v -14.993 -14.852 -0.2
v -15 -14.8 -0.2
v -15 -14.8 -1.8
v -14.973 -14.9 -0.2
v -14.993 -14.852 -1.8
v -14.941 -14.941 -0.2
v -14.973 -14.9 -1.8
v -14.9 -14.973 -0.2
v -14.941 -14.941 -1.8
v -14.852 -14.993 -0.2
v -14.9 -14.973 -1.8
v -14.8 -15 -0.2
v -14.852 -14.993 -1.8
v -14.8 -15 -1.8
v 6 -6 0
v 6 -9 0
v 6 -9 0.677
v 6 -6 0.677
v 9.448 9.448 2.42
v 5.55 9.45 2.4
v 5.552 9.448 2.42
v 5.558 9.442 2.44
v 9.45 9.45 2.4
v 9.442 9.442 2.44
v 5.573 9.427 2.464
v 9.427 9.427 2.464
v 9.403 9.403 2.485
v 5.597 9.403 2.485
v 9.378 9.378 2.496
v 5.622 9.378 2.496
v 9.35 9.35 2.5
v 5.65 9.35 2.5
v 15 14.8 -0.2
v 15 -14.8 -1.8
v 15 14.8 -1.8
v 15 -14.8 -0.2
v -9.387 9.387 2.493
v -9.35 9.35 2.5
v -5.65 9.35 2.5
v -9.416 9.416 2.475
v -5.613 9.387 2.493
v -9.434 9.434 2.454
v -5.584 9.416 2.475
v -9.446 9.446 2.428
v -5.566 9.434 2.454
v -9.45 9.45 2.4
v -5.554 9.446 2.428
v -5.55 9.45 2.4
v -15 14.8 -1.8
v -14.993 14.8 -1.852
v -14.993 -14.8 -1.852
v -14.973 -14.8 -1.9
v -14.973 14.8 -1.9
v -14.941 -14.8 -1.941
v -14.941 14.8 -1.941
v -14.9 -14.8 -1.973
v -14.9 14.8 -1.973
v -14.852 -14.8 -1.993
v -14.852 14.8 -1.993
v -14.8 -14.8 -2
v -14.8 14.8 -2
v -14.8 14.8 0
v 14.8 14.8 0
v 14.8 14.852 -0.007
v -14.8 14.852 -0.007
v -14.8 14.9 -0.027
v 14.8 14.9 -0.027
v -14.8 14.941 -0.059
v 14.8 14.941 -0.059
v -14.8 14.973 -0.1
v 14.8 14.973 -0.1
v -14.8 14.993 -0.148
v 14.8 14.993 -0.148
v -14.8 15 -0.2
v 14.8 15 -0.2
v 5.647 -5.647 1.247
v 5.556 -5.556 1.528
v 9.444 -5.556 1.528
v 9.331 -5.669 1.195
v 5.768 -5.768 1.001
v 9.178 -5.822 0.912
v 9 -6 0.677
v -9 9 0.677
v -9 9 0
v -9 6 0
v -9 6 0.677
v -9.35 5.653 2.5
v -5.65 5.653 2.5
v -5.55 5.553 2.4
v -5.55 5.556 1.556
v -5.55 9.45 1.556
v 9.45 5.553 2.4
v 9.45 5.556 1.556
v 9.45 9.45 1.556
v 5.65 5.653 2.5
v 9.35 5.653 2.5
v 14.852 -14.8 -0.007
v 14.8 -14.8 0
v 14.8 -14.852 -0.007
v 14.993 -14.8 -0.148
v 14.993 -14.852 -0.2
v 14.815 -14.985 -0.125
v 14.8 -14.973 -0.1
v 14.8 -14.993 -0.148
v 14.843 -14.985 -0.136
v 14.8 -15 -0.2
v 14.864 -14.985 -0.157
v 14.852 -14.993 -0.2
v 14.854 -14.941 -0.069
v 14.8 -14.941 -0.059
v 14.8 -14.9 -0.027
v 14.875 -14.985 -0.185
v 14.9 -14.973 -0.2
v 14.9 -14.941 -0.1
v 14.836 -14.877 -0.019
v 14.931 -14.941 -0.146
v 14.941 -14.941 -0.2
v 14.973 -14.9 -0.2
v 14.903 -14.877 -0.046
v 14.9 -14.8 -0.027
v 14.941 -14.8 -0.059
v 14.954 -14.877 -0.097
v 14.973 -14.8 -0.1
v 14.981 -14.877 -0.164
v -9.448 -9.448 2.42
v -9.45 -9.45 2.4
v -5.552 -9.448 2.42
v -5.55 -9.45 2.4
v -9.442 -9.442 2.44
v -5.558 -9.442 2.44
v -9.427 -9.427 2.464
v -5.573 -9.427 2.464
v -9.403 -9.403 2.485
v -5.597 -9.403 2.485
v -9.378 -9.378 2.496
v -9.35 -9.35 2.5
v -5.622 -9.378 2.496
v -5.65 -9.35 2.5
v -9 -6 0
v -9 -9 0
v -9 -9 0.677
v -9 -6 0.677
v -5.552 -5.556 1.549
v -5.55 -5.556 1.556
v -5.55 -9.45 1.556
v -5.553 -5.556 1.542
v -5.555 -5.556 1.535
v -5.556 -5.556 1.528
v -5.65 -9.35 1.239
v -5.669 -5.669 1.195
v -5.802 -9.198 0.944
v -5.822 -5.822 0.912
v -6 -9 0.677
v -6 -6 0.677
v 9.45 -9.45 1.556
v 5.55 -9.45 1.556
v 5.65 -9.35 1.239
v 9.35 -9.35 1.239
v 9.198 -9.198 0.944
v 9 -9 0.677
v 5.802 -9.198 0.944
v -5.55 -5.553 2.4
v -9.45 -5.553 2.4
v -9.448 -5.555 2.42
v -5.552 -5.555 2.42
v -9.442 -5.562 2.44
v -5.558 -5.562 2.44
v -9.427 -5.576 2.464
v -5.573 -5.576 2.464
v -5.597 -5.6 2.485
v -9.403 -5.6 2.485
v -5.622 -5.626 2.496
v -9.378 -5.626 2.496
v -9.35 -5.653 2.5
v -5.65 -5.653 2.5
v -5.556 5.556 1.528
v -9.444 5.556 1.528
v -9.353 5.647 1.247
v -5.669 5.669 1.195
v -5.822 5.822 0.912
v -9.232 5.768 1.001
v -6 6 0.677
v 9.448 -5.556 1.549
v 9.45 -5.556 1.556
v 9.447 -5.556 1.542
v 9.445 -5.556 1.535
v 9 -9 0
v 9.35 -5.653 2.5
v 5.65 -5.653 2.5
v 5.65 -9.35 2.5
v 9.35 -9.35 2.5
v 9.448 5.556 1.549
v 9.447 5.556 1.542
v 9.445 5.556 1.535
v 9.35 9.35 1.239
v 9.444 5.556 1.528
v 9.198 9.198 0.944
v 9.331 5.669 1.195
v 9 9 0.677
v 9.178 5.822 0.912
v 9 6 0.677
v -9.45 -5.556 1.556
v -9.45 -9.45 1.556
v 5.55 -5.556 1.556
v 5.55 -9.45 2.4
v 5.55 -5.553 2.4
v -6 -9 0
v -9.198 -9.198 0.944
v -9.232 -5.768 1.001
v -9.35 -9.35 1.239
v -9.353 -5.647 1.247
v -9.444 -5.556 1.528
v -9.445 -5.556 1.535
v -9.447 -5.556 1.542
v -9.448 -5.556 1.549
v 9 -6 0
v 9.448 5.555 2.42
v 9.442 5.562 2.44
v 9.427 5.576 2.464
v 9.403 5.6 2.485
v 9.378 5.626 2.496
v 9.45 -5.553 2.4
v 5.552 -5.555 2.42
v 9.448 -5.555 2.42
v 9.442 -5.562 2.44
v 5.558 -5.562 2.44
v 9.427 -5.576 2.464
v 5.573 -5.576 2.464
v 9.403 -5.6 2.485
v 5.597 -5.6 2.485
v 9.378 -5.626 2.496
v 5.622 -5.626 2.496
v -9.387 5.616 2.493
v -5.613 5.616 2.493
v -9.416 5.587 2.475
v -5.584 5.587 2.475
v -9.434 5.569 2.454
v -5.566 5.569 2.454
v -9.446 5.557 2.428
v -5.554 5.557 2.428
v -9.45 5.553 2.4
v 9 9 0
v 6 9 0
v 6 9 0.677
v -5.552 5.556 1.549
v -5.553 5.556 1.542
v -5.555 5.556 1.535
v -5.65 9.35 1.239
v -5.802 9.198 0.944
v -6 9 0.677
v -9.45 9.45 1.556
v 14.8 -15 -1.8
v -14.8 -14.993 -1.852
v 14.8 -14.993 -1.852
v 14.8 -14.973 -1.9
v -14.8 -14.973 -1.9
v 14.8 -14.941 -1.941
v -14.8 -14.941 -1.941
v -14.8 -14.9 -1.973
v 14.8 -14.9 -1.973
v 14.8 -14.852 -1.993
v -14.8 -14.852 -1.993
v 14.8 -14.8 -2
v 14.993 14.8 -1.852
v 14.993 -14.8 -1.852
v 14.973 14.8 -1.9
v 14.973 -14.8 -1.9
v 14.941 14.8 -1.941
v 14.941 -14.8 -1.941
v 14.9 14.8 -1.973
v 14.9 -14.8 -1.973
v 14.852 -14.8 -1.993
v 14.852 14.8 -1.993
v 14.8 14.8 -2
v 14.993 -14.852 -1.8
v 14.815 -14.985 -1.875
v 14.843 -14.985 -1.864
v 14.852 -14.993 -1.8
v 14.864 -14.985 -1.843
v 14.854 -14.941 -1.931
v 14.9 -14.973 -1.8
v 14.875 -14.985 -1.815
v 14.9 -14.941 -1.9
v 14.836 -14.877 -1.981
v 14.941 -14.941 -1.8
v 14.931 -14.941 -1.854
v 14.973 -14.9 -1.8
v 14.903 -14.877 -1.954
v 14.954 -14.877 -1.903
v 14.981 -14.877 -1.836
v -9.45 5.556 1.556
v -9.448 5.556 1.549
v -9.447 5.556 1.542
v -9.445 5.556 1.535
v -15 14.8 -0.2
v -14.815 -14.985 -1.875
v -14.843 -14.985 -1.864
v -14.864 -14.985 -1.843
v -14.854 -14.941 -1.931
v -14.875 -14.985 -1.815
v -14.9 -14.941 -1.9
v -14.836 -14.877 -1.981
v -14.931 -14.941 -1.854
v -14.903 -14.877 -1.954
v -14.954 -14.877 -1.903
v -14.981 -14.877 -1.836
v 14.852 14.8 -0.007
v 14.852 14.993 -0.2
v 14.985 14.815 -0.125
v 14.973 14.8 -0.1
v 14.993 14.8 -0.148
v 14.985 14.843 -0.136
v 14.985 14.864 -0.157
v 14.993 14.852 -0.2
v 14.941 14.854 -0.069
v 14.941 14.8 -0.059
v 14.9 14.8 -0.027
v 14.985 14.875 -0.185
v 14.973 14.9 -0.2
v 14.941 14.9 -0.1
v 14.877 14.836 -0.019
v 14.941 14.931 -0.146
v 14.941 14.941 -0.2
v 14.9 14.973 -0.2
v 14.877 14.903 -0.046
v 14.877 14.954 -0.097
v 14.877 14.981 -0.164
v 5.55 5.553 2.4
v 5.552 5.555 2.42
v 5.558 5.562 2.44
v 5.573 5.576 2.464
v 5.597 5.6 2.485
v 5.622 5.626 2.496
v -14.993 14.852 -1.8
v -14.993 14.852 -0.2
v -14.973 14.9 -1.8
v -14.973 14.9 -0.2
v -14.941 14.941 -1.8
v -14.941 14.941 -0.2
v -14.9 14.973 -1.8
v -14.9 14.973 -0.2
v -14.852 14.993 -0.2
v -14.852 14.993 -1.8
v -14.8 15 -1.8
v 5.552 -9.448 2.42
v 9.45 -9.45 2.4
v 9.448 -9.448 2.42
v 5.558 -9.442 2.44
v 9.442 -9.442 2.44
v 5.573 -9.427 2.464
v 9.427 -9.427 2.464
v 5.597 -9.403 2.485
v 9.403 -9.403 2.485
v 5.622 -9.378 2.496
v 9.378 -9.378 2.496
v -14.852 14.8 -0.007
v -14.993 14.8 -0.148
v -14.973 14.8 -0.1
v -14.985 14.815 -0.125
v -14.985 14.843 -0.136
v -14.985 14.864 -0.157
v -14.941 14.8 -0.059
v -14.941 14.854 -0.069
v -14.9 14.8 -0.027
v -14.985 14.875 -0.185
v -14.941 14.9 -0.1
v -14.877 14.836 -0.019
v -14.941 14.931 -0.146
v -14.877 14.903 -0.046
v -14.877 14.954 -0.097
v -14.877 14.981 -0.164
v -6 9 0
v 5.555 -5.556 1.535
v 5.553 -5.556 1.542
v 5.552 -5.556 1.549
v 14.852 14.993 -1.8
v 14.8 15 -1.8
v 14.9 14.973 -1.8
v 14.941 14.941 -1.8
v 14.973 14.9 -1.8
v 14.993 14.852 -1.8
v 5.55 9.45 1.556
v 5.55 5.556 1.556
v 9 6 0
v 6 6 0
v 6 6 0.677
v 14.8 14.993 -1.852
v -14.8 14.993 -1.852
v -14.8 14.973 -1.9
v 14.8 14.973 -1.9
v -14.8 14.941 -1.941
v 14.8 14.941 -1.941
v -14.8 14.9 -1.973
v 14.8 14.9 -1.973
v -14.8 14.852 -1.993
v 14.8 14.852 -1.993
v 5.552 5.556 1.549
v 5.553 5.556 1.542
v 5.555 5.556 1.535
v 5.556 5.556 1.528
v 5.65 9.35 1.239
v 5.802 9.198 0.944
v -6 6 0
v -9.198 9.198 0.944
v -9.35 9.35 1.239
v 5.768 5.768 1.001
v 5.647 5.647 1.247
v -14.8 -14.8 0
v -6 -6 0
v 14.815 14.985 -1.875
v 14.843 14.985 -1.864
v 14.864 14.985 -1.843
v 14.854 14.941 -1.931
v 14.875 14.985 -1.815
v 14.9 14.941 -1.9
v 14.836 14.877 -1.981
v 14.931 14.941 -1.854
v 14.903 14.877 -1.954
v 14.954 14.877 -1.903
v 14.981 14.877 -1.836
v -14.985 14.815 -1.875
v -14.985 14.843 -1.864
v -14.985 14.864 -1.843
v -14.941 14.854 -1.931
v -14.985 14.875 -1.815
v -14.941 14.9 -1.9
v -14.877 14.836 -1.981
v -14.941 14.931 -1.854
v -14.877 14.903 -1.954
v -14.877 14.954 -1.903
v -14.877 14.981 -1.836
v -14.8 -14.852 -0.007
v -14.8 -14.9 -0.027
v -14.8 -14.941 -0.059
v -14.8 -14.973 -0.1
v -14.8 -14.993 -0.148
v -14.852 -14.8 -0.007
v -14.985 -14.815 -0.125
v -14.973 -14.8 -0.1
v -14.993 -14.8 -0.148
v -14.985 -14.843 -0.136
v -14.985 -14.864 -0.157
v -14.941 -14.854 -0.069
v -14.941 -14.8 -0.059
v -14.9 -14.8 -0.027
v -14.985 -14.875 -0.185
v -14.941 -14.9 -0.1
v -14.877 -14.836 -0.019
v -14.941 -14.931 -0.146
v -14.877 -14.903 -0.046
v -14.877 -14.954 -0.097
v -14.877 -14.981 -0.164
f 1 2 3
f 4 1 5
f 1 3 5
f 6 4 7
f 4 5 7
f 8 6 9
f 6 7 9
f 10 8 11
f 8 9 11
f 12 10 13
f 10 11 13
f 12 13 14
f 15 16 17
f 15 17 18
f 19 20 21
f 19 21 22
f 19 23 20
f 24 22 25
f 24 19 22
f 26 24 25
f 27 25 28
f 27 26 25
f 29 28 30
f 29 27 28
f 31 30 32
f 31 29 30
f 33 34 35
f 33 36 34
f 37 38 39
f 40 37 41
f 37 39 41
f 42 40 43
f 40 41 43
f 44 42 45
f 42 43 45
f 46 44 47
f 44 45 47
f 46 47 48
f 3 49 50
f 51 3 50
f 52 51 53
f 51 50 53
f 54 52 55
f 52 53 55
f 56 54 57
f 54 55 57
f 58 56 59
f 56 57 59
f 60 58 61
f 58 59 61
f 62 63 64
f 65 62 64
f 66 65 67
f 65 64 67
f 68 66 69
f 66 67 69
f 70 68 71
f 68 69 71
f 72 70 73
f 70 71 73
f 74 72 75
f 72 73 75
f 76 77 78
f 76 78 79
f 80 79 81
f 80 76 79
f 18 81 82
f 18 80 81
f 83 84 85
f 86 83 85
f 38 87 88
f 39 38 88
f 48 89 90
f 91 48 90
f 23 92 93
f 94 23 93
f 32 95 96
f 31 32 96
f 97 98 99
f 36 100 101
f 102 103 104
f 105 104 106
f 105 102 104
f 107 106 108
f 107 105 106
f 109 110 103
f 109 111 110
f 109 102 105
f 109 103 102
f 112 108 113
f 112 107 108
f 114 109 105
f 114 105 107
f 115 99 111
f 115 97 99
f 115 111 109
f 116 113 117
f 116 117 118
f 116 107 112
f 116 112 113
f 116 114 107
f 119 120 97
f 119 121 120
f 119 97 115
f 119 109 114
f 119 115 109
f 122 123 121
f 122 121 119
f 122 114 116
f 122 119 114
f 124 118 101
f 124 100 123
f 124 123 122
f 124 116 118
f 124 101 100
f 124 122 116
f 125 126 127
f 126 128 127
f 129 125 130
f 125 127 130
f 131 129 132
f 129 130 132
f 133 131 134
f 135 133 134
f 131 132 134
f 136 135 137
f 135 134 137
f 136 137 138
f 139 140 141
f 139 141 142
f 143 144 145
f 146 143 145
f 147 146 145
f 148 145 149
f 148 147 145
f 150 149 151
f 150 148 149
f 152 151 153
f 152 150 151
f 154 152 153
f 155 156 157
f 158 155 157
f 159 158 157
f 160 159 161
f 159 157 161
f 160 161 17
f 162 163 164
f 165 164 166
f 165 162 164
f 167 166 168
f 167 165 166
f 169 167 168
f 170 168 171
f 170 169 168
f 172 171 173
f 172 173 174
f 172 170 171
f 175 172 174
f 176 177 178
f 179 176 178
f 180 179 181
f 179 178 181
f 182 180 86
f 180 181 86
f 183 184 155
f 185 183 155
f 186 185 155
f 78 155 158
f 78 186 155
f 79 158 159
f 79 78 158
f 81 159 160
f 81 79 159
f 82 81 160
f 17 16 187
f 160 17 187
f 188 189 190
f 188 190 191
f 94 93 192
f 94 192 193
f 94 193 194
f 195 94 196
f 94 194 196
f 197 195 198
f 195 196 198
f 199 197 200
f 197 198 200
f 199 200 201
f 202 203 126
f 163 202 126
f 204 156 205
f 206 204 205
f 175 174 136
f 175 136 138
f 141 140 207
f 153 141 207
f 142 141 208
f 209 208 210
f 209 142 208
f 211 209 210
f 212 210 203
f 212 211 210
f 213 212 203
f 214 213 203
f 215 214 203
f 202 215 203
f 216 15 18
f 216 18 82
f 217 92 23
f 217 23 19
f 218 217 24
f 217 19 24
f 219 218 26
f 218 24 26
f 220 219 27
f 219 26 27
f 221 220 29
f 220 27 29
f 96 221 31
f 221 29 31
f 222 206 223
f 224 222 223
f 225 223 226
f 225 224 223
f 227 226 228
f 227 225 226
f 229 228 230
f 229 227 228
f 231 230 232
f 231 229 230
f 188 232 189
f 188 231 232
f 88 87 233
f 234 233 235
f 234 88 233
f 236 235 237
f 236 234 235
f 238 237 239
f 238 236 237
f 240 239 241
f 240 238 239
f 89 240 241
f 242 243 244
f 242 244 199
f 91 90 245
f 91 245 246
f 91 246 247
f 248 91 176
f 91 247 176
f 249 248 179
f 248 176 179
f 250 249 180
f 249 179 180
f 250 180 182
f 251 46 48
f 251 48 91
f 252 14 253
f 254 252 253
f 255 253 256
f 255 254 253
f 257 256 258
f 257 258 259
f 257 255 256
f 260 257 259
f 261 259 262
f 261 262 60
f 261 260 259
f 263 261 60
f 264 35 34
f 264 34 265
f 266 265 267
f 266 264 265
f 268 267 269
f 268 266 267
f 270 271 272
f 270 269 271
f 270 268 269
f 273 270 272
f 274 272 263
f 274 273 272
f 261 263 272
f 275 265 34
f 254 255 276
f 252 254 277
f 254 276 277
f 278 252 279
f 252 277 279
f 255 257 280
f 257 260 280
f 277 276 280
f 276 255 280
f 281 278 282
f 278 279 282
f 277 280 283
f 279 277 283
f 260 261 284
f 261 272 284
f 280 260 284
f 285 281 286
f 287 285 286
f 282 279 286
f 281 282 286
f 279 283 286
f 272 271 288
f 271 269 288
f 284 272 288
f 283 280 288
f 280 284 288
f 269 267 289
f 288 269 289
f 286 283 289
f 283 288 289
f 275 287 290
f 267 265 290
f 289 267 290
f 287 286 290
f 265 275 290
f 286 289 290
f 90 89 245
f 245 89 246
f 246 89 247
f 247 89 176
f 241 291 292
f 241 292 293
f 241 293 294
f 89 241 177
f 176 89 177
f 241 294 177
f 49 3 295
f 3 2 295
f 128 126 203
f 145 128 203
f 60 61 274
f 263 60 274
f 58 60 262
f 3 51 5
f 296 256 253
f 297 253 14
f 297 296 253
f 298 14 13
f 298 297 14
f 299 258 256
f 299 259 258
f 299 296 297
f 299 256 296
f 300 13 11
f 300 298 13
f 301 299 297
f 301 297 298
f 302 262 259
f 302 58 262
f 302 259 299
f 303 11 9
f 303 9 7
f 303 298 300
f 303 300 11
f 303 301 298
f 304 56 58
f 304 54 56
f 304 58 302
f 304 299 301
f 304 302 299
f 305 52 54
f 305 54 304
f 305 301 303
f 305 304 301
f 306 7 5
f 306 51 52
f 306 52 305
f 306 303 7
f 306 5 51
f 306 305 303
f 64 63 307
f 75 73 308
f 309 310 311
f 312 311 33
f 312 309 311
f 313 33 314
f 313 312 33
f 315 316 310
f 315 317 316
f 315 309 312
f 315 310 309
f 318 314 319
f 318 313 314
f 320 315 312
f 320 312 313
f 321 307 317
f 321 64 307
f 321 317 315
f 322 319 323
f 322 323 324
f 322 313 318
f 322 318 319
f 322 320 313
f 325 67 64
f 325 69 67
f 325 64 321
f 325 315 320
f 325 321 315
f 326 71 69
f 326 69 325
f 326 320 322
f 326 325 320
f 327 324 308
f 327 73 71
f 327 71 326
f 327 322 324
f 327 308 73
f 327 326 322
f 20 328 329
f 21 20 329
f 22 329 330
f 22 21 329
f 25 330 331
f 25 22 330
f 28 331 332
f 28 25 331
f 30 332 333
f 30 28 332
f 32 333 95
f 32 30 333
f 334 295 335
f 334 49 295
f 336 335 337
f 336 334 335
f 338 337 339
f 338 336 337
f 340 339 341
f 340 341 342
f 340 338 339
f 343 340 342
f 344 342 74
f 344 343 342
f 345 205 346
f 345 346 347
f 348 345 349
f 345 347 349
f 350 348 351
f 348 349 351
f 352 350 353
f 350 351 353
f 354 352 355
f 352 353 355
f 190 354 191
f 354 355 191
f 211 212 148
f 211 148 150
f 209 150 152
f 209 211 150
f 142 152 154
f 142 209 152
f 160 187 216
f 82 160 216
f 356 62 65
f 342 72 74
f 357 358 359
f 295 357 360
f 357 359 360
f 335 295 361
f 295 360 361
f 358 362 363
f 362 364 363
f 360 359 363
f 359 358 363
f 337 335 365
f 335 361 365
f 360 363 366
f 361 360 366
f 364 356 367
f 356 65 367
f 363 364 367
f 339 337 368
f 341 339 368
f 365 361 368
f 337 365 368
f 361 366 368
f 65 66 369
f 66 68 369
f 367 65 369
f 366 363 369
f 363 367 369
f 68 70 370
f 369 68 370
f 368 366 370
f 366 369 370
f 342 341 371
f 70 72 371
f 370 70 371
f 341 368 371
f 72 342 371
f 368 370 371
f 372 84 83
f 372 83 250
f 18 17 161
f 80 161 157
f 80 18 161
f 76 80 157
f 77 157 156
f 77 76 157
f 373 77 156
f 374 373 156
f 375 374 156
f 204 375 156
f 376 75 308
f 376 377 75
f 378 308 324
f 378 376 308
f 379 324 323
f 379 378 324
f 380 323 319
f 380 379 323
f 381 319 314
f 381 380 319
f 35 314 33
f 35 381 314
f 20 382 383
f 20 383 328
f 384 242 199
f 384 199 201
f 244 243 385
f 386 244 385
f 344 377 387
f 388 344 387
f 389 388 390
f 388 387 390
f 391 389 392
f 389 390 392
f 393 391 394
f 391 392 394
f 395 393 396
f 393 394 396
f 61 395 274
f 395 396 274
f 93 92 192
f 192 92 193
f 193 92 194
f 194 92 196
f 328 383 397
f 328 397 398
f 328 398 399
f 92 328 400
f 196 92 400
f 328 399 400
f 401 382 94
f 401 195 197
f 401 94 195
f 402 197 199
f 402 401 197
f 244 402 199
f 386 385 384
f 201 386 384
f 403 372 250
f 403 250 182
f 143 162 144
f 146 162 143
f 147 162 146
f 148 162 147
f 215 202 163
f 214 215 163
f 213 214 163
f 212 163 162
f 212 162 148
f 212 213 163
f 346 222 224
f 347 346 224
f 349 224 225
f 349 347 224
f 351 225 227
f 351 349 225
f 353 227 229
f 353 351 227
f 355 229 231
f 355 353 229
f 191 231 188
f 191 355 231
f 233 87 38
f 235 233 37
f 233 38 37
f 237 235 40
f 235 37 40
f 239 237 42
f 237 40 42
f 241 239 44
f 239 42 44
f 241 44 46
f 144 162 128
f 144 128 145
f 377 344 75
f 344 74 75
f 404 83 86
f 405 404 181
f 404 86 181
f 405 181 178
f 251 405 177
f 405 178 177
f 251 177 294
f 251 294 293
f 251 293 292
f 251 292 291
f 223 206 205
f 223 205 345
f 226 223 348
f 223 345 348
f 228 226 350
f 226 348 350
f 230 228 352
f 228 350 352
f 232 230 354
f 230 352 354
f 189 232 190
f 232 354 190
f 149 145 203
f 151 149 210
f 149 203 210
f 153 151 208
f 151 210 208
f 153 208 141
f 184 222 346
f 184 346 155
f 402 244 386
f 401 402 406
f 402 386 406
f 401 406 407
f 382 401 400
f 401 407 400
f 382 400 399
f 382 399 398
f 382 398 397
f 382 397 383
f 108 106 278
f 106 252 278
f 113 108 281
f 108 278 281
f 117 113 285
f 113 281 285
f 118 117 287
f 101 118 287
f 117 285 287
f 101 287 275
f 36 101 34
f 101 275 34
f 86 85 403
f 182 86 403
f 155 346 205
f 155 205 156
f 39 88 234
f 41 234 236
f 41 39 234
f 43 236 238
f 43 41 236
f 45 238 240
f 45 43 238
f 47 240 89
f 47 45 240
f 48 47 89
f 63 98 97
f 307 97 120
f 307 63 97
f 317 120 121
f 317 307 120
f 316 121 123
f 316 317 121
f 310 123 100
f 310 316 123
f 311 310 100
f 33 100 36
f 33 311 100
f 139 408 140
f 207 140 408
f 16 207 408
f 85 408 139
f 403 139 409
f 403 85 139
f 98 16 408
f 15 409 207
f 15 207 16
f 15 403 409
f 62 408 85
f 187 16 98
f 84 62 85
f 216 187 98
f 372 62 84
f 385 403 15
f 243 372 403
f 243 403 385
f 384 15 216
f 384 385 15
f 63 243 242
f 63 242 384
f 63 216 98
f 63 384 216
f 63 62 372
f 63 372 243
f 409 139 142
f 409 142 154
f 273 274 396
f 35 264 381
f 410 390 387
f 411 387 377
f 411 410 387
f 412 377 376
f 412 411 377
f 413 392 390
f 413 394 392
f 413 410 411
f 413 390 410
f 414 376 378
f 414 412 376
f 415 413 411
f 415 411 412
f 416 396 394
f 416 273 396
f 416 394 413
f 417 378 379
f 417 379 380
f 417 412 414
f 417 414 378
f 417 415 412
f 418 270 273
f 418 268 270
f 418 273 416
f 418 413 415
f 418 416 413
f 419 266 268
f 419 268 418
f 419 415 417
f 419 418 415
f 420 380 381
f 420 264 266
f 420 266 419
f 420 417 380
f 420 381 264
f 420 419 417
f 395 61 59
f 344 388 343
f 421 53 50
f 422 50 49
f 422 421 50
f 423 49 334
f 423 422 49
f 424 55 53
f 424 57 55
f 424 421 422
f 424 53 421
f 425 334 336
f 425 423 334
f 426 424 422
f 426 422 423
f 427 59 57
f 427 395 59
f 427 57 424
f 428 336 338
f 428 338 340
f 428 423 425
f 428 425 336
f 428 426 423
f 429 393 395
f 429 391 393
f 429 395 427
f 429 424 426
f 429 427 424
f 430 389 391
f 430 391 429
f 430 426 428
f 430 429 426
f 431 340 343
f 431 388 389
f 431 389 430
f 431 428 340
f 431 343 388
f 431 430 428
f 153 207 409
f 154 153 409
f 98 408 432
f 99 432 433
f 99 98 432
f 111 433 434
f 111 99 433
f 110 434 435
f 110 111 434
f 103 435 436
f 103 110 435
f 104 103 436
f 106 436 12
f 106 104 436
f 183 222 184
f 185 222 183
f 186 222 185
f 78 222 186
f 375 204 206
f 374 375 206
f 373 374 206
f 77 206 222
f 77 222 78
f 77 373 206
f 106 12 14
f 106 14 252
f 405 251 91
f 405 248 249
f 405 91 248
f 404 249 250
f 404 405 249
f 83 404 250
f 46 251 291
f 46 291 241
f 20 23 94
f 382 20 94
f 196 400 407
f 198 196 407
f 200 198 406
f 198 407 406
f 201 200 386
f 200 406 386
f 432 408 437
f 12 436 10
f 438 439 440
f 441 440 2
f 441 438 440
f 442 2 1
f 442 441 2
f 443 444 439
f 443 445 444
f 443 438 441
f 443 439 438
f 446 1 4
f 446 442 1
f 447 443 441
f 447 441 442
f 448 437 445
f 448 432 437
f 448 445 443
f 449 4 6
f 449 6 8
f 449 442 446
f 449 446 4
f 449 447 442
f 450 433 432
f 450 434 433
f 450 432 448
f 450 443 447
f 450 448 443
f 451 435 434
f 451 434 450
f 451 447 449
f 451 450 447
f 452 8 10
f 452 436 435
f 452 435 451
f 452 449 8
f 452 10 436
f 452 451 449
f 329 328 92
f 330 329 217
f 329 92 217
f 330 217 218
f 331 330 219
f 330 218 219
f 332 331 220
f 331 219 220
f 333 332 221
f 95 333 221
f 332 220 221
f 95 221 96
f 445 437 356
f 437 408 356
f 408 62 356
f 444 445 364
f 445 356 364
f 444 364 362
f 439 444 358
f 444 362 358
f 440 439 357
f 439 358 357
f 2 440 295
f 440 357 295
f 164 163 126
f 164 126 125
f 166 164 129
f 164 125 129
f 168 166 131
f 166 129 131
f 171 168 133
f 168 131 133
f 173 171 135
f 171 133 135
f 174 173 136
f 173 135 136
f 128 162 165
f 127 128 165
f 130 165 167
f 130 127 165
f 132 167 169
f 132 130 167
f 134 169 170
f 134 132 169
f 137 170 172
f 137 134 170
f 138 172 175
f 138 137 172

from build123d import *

# Parameters (mm, degrees)
SKETCH_1_W          = 30
SKETCH_1_H          = 30
EXTRUDE_1_DEPTH     = 2
SKETCH_2_W          = 3
SKETCH_2_H          = 3
EXTRUDE_2_DEPTH     = 1
EXTRUDE_START       = 5
EXTRUDE_3_DEPTH     = 5
CUT_EXTRUDE_1_DEPTH = 29.793271784
FILLET_1_R          = 0.1
FILLET_2_R          = 0.2


with BuildPart() as part:
    # 草图1 → 凸台-拉伸1 (new body)
    with BuildSketch(Plane.XY):
        Rectangle(SKETCH_1_W, SKETCH_1_H)
    extrude(amount=-EXTRUDE_1_DEPTH)

    # 草图2 → 凸台-拉伸2 (add)
    with BuildSketch(Plane.XY):
        with Locations((-7.5, -7.5)):
            Rectangle(SKETCH_2_W, SKETCH_2_H)
        with Locations((7.5, -7.5)):
            Rectangle(SKETCH_2_W, SKETCH_2_H)
    extrude_2 = extrude(amount=EXTRUDE_2_DEPTH)

    # 草图3 → 凸台-拉伸3 (add)
    with BuildSketch(Plane.XZ.offset(EXTRUDE_START)):
        with BuildLine():
            Line((-9.45, 2.5), (-5.55, 2.5))
            Line((-5.55, 2.5), (-5.55, 1.555590279))
            ThreePointArc((-5.55, 1.555590279), (-5.719957697, 1.088161527), (-6, 0.677124344))
            Line((-6, 0.677124344), (-9, 0.677124344))
            ThreePointArc((-9, 0.677124344), (-9.280042303, 1.088161527), (-9.45, 1.555590279))
            Line((-9.45, 1.555590279), (-9.45, 2.5))
        make_face()
        with BuildLine():
            Line((9, 0.677124344), (6, 0.677124344))
            ThreePointArc((6, 0.677124344), (5.719957697, 1.088161527), (5.55, 1.555590279))
            Line((5.55, 1.555590279), (5.55, 2.5))
            Line((5.55, 2.5), (9.45, 2.5))
            Line((9.45, 2.5), (9.45, 1.555590279))
            ThreePointArc((9.45, 1.555590279), (9.280042303, 1.088161527), (9, 0.677124344))
        make_face()
    extrude_3 = extrude(amount=EXTRUDE_3_DEPTH)

    # 草图4 → 切除-拉伸1 (cut, through all)
    with BuildSketch(Plane.ZY.offset(9.45)):
        with BuildLine():
            Line((2.5, -5.5530417), (1.528231876, -5.556437591))
            ThreePointArc((1.528231876, -5.556437591), (1.075676747, -5.72640858), (0.677124344, -6))
            Line((0.677124344, -6), (0.677124344, -5))
            Line((0.677124344, -5), (2.5, -5))
            Line((2.5, -5), (2.5, -5.5530417))
        make_face()
        with BuildLine():
            Line((0.677124344, -10), (2.5, -10))
            Line((2.5, -10), (2.5, -9.45))
            Line((2.5, -9.45), (1.555590279, -9.45))
            ThreePointArc((1.555590279, -9.45), (1.088161527, -9.280042303), (0.677124344, -9))
            Line((0.677124344, -9), (0.677124344, -10))
        make_face()
    cut_extrude_1 = extrude(amount=-CUT_EXTRUDE_1_DEPTH, mode=Mode.SUBTRACT)

    # 镜向1: 凸台-拉伸2, 凸台-拉伸3, 切除-拉伸1 across plane
    add(extrude_2.mirror(Plane.ZX))
    add(extrude_3.mirror(Plane.ZX))
    add(cut_extrude_1.mirror(Plane.ZX), mode=Mode.SUBTRACT)

    # 圆角1
    fillet_1_edges = [part.edges().sort_by_distance(p)[0] for p in [
        (-5.55, -7.50152085, 2.5),
        (-9.45, -7.50152085, 2.5),
        (5.55, -7.50152085, 2.5),
        (9.45, -7.50152085, 2.5),
        (7.5, -9.45, 2.5),
        (-7.5, -9.45, 2.5),
        (7.5, 5.5530417, 2.5),
        (-7.5, 5.5530417, 2.5),
        (-5.55, 7.50152085, 2.5),
        (-9.45, 7.50152085, 2.5),
        (9.45, 7.50152085, 2.5),
        (5.55, 7.50152085, 2.5),
        (7.5, 9.45, 2.5),
        (-7.5, 9.45, 2.5),
        (7.5, -5.5530417, 2.5),
        (-7.5, -5.5530417, 2.5),
    ]]
    fillet(fillet_1_edges, radius=FILLET_1_R)

    # 圆角2
    fillet_2_edges = [part.edges().sort_by_distance(p)[0] for p in [
        (15, 0, -2),
        (0, 15, -2),
        (-15, 0, -2),
        (0, 15, 0),
        (15, 0, 0),
        (0, -15, 0),
        (-15, 0, 0),
        (0, -15, -2),
        (-15, 15, -1),
        (15, 15, -1),
        (15, -15, -1),
        (-15, -15, -1),
    ]]
    fillet(fillet_2_edges, radius=FILLET_2_R)


solid = part.part
